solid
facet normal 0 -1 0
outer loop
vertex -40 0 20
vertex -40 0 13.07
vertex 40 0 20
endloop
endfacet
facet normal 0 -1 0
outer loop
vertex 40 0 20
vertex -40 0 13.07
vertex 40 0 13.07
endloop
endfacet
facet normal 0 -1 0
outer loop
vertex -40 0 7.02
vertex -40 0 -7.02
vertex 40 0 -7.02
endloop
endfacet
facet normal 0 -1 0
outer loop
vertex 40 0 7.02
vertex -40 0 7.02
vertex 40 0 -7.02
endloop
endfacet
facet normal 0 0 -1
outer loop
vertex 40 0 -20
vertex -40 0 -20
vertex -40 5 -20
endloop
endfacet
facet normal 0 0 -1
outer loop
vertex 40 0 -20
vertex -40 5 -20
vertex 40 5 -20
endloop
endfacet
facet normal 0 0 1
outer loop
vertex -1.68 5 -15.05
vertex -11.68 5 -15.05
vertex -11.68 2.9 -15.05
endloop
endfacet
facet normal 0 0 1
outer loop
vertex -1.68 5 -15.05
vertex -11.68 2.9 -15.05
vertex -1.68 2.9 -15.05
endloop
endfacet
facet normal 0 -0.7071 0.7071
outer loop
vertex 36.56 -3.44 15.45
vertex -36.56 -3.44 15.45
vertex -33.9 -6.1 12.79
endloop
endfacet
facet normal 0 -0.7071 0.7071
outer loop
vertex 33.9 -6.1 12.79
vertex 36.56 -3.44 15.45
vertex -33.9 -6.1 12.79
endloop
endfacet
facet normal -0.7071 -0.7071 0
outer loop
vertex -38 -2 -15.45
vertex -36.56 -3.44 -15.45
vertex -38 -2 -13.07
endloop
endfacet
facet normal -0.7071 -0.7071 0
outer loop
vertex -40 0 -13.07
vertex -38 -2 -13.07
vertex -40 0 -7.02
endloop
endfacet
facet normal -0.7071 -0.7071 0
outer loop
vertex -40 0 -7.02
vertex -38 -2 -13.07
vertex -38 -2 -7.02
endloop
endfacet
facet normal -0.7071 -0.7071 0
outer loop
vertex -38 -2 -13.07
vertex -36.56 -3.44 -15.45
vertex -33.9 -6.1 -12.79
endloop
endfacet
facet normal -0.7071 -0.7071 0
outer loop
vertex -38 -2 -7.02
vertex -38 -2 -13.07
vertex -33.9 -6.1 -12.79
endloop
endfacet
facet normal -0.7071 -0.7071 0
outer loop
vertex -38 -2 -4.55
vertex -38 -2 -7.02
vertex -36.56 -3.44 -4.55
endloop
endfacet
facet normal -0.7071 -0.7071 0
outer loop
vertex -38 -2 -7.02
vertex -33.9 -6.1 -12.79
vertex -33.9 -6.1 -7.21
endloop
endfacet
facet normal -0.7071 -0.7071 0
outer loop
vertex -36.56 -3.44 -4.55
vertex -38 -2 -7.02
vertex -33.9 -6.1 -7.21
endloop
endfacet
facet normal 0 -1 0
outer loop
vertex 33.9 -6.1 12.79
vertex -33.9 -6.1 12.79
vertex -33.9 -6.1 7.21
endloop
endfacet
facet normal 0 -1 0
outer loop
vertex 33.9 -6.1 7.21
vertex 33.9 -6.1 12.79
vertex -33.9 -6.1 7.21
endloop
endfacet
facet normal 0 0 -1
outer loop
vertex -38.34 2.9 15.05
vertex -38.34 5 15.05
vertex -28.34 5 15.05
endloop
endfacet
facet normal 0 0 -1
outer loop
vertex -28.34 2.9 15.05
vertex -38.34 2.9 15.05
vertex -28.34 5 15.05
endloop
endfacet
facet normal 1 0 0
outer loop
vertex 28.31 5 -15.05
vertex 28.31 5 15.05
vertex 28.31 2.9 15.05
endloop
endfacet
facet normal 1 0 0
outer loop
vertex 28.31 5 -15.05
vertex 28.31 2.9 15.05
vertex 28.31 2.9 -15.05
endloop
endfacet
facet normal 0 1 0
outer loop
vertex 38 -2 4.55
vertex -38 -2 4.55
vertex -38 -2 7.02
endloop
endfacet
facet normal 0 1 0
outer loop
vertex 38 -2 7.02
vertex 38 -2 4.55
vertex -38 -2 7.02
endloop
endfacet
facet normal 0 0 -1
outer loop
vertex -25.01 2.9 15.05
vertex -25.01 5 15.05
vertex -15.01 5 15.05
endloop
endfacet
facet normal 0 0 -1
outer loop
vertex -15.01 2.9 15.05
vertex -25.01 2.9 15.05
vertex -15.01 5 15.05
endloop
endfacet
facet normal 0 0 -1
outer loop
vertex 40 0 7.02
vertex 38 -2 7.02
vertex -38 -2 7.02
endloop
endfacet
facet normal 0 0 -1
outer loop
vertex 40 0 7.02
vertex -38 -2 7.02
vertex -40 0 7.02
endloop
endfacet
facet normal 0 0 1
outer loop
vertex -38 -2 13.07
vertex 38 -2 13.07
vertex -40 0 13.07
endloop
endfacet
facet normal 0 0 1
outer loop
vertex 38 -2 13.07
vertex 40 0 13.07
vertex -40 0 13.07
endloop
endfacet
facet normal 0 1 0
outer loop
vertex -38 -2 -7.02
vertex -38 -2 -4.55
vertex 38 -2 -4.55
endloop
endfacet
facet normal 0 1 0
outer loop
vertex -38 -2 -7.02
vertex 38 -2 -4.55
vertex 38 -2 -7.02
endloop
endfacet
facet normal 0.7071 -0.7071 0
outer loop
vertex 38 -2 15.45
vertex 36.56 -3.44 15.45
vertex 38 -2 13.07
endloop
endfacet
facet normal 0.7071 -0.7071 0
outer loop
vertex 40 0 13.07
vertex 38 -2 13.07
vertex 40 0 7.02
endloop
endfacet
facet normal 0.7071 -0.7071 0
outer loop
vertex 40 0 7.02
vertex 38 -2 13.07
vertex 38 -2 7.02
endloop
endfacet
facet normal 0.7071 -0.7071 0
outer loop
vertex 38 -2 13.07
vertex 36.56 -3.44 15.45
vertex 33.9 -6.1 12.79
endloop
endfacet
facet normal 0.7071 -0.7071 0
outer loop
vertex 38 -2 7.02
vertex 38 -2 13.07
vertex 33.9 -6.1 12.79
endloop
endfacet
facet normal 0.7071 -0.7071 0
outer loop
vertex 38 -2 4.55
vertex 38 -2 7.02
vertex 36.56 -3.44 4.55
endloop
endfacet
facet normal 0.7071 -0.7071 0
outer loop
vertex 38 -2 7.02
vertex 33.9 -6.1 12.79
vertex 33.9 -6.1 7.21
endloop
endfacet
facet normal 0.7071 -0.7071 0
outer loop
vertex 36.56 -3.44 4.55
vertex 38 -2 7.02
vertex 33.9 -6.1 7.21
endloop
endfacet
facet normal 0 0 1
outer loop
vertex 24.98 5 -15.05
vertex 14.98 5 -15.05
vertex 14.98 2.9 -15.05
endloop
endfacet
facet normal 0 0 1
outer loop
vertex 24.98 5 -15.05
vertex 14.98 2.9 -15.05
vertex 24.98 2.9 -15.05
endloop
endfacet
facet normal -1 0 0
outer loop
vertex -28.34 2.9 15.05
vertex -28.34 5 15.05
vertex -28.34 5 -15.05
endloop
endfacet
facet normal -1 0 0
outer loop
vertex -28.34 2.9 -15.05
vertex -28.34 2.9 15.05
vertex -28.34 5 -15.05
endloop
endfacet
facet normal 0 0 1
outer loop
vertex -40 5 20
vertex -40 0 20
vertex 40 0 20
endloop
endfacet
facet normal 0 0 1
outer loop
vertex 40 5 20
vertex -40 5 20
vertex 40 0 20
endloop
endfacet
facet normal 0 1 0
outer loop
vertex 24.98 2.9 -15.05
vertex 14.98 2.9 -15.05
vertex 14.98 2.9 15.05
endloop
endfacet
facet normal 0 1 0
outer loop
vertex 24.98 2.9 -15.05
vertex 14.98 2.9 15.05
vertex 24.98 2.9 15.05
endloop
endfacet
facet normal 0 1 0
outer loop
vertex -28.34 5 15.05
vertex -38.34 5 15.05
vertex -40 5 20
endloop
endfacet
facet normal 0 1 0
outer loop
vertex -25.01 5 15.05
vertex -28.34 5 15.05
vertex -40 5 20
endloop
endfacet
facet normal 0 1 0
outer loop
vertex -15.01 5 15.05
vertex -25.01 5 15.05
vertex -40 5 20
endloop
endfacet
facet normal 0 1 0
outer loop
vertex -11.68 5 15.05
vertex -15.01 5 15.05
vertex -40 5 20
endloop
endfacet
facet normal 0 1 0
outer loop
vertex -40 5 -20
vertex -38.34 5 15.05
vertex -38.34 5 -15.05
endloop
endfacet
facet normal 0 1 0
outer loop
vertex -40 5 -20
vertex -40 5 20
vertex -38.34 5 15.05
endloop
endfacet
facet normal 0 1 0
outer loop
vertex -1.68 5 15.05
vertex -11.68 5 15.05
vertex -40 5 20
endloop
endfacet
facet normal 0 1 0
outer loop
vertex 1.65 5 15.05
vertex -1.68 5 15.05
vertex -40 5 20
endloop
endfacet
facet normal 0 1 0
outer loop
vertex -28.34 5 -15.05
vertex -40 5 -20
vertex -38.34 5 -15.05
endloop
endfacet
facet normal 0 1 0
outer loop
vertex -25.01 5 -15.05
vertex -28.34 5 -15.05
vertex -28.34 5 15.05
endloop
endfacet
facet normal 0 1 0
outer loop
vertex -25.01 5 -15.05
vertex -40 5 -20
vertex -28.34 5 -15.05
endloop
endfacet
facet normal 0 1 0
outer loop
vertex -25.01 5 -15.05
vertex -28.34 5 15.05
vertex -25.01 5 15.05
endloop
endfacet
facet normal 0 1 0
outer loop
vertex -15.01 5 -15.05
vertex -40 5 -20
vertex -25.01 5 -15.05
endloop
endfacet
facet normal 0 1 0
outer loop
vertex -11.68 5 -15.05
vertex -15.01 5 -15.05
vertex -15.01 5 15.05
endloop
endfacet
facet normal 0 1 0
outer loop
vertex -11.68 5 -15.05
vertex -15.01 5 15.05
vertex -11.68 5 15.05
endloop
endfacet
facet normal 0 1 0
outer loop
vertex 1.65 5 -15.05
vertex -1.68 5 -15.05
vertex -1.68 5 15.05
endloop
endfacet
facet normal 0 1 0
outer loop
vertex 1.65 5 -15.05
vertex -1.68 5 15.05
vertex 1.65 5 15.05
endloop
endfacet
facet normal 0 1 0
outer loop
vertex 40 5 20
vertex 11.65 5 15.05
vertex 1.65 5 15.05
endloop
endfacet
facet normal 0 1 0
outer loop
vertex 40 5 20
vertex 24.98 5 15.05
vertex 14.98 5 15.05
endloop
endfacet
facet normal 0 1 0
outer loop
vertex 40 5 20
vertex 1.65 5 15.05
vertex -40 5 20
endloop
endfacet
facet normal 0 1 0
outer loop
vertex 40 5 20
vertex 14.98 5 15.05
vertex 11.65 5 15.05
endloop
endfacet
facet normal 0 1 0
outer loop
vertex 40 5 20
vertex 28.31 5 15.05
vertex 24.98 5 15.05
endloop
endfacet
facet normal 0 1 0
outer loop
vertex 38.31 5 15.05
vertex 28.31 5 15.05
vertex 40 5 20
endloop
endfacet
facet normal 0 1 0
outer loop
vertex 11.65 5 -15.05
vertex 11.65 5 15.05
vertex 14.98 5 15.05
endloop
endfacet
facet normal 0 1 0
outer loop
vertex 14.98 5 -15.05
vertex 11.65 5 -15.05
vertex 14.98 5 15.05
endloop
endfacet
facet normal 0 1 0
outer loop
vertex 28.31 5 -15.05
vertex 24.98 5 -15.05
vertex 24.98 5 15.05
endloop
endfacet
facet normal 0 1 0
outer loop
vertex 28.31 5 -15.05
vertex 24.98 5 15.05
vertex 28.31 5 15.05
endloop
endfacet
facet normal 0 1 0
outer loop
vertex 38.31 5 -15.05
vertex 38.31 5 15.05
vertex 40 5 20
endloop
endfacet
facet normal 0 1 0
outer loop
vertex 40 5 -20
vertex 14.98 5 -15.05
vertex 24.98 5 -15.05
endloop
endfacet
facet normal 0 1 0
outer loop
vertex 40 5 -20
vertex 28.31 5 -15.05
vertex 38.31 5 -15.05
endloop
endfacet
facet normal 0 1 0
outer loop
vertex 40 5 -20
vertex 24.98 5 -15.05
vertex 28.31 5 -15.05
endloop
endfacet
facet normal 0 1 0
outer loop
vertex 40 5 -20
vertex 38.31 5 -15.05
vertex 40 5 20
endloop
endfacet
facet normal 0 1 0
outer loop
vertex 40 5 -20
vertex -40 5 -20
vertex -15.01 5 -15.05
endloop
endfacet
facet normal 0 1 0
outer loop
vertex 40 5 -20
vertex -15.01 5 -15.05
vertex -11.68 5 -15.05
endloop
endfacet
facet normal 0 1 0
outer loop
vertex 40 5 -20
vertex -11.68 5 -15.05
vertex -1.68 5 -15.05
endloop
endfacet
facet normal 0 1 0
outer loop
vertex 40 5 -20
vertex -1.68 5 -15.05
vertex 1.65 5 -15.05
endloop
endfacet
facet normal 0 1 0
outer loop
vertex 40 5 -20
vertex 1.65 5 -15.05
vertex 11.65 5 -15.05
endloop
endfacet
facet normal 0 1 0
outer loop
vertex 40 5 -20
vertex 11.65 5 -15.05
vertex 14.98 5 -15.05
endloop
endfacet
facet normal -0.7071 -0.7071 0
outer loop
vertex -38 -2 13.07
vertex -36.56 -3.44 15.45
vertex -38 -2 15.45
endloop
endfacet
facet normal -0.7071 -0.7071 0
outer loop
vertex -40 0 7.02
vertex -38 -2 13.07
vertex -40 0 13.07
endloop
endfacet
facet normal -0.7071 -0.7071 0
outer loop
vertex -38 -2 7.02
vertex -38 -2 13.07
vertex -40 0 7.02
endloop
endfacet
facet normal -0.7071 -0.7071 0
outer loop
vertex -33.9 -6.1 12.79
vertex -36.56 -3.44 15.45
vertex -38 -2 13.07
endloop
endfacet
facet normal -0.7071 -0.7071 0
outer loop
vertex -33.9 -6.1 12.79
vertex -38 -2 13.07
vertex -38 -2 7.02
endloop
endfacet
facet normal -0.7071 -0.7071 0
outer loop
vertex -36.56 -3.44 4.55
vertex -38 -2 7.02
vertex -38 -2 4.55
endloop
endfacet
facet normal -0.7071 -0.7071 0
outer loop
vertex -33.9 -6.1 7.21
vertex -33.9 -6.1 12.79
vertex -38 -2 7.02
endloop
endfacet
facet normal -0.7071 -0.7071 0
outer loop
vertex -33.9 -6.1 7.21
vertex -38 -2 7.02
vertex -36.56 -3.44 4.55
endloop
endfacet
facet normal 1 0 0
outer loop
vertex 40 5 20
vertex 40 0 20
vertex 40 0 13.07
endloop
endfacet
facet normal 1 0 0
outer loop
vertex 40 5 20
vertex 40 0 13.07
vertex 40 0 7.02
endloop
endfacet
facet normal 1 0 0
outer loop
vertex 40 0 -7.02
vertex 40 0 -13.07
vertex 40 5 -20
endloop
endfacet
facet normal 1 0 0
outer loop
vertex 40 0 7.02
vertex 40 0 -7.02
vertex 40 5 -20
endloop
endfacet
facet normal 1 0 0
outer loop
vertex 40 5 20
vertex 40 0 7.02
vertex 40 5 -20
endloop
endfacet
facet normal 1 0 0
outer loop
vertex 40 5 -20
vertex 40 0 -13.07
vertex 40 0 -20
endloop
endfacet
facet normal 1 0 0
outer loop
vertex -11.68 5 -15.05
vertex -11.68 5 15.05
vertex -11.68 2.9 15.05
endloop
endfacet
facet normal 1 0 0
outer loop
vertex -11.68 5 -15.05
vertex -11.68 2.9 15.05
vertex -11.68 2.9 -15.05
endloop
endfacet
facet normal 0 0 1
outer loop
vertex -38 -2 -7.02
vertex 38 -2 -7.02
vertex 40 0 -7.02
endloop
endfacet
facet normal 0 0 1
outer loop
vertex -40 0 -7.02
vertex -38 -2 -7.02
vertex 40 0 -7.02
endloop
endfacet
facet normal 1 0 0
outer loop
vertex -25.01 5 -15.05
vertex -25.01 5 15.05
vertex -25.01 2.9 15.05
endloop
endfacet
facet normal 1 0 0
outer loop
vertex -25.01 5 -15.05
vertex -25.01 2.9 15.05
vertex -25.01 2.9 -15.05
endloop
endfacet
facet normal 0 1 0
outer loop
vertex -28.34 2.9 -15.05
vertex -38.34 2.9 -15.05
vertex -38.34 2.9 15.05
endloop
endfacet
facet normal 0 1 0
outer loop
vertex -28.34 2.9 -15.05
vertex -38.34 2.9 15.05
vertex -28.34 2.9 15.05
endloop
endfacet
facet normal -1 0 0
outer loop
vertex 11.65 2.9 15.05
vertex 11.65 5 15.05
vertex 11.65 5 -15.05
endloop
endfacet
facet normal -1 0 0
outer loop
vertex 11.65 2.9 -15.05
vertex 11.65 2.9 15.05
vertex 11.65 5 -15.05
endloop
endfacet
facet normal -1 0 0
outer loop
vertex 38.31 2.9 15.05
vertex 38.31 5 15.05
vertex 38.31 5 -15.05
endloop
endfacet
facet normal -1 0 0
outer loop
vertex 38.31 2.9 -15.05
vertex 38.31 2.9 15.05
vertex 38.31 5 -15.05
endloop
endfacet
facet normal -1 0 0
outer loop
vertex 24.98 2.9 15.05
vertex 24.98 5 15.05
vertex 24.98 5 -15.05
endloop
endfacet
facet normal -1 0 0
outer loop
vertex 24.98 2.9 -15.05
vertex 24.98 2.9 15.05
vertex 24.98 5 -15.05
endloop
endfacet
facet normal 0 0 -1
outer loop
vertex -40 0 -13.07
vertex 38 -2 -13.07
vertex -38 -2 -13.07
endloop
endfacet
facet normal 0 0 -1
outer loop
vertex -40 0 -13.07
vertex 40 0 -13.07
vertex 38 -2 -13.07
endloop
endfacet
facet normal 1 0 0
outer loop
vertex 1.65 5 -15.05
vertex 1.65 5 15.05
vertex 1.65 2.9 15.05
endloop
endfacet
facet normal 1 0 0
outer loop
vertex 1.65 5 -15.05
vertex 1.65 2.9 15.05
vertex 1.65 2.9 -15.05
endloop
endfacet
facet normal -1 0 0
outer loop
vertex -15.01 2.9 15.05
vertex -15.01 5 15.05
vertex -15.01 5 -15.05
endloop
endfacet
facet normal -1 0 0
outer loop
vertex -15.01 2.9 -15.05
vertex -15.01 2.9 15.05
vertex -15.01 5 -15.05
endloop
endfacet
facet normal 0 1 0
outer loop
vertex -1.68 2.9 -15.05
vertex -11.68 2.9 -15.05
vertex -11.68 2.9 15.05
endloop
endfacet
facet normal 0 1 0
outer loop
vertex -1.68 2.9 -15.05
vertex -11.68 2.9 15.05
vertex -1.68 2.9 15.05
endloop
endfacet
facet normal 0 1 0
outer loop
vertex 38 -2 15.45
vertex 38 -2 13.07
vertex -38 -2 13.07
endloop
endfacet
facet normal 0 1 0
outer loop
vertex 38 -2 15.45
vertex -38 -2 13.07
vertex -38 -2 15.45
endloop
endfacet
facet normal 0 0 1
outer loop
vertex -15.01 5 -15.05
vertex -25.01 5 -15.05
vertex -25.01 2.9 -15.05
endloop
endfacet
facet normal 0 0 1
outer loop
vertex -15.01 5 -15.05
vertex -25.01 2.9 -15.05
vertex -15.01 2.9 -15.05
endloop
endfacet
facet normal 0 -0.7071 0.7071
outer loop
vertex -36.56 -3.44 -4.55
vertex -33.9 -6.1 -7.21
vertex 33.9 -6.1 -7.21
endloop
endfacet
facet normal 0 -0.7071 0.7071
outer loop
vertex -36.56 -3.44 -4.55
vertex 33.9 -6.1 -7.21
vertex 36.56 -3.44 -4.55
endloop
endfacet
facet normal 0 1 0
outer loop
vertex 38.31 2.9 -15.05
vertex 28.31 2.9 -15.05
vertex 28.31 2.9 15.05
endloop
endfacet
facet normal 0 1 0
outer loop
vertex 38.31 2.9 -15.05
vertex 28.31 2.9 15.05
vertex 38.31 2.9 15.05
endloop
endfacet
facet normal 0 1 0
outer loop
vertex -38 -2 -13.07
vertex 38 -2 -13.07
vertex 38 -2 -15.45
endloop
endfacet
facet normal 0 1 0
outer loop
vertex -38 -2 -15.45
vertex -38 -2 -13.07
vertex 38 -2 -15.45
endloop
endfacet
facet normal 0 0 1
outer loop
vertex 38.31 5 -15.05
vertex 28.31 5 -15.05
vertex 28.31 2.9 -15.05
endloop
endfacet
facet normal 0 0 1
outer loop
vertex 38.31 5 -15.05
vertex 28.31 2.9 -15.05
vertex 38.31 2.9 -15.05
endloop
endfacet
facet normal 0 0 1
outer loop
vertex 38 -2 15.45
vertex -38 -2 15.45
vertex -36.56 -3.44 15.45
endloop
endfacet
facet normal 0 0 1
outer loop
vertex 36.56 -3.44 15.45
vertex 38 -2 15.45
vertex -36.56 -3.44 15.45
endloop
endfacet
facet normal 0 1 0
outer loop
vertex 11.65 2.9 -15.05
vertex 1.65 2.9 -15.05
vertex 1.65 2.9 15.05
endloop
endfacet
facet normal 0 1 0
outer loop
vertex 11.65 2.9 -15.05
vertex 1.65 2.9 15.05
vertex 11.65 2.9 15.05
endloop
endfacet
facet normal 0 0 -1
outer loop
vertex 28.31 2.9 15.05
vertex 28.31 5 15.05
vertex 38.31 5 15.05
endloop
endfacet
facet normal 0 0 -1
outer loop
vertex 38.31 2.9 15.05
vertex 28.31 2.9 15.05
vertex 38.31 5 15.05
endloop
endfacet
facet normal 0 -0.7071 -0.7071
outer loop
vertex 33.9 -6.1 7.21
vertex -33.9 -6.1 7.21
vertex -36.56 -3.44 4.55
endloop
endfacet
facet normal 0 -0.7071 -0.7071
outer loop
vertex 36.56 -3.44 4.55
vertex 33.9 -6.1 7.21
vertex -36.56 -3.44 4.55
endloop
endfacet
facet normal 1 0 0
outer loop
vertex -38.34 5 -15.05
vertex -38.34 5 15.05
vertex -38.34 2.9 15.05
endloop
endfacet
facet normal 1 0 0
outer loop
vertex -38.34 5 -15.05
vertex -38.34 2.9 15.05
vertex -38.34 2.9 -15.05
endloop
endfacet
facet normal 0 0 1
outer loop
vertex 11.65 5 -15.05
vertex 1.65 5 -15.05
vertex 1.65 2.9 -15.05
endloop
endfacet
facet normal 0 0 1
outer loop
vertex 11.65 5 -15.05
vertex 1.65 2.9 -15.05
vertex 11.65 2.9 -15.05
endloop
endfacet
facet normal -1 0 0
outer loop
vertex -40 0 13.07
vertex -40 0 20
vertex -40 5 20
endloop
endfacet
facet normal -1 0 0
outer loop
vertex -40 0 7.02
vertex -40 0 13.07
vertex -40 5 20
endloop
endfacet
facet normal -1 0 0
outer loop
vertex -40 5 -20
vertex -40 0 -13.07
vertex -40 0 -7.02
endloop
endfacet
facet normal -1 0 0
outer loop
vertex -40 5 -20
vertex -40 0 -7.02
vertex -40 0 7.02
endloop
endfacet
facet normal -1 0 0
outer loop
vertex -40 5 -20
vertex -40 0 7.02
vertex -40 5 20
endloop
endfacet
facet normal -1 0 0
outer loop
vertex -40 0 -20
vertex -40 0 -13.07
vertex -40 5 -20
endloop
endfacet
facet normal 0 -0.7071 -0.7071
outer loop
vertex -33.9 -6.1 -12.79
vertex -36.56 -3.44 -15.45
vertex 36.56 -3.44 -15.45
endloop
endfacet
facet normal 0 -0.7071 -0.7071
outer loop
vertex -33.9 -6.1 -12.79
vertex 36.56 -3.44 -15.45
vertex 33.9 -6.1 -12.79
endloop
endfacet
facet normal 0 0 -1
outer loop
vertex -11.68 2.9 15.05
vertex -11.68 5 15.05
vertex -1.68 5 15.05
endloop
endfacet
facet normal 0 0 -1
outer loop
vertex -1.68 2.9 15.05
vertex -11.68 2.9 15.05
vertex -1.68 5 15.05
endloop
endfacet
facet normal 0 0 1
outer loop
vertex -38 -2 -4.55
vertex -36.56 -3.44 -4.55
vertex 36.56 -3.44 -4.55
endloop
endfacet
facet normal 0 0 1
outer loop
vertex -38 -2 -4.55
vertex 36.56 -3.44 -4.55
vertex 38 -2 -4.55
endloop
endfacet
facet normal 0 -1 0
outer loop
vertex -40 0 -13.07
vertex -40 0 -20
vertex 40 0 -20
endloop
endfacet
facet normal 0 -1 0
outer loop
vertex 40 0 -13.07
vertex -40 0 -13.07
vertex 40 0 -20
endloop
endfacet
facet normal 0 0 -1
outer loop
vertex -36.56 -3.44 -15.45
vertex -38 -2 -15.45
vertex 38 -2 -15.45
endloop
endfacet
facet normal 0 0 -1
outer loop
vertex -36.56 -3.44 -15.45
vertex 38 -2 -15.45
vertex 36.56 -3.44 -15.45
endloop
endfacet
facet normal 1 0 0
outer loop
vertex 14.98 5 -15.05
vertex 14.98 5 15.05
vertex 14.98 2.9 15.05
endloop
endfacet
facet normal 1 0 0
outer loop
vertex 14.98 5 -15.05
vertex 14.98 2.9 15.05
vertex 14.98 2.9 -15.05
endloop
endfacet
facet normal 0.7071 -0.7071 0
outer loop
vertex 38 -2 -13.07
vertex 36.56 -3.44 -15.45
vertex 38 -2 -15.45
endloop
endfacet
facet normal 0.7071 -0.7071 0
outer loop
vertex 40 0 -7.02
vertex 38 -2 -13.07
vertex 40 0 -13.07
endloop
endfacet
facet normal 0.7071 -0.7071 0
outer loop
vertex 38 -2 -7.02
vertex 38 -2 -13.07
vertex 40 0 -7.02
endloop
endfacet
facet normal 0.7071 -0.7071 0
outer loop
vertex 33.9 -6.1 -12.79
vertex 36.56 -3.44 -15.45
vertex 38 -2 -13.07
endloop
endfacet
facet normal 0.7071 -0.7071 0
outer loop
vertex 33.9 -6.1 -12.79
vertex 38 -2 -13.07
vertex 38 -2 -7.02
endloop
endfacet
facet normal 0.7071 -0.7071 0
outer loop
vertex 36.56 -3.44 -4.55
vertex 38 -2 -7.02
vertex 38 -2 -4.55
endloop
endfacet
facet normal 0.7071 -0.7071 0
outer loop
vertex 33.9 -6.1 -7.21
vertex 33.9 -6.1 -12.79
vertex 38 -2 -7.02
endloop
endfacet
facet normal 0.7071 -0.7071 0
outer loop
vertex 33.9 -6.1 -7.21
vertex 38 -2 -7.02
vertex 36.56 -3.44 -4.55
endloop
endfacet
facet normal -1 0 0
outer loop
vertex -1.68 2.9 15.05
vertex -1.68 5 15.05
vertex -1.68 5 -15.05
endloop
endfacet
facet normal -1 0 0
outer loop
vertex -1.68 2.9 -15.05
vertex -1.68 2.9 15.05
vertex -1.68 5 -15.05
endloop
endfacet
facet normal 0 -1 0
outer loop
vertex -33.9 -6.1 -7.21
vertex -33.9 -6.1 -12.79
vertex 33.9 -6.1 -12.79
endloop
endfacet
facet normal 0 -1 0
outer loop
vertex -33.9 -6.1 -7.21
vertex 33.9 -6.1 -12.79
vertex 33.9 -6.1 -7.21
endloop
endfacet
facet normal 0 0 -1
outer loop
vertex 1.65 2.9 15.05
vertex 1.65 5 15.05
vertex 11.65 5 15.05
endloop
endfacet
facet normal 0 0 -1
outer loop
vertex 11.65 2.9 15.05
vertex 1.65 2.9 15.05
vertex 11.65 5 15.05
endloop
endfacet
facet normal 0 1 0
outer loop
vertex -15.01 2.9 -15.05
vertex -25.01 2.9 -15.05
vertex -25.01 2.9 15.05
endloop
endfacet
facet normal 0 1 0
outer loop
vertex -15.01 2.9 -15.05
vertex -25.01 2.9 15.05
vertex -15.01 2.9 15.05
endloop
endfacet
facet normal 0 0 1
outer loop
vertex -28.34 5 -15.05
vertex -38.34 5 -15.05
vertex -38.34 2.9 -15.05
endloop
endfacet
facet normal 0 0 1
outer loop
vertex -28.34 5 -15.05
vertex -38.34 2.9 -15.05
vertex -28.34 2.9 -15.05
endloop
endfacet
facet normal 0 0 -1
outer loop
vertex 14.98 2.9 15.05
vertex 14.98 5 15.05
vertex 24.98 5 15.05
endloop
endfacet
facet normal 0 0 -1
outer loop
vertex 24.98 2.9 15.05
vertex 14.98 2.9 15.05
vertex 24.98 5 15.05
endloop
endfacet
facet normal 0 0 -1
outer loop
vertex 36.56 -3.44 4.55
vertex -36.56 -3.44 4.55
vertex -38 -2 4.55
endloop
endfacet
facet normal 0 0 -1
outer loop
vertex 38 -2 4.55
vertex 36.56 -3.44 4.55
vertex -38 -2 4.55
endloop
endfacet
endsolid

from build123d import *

# Parameters (mm, degrees)
SKETCH_1_W             = 80
SKETCH_1_H             = 40
EXTRUDE_1_DEPTH        = 5
SKETCH_2_W             = 10
SKETCH_2_H             = 30.1
CUT_EXTRUDE_1_DEPTH    = 2.1
PATTERN_LINEAR_1_COUNT = 6
PATTERN_LINEAR_1_PITCH = 13.33
EXTRUDE_2_DEPTH        = 80
CHAMFER_1_SIZE         = 6.1


with BuildPart() as part:
    # Эскиз1 → Бобышка-Вытянуть1 (new body)
    with BuildSketch(Plane(origin=(0, 0, 0), x_dir=(1, 0, 0), z_dir=(0, 1, 0))):
        Rectangle(SKETCH_1_W, SKETCH_1_H)
    extrude(amount=EXTRUDE_1_DEPTH)

    # Эскиз2 → Вырез-Вытянуть1 (cut)
    with BuildSketch(Plane(origin=(0, 5, 0), x_dir=(1, 0, 0), z_dir=(0, 1, 0))):
        with Locations((-33.34, 0)):
            Rectangle(SKETCH_2_W, SKETCH_2_H)
    cut_extrude_1 = extrude(amount=-CUT_EXTRUDE_1_DEPTH, mode=Mode.SUBTRACT)

    # Линейный массив1: Вырез-Вытянуть1 ×6
    with Locations(*[(i * PATTERN_LINEAR_1_PITCH, 0, 0) for i in range(1, PATTERN_LINEAR_1_COUNT)]):
        add(cut_extrude_1, mode=Mode.SUBTRACT)

    # Эскиз3 → Бобышка-Вытянуть2 (add)
    with BuildSketch(Plane.ZY.offset(40)):
        Polygon((-13.07, 0), (-13.07, -2), (-15.45, -2), (-15.45, -3.44), (-12.79, -6.1), (-7.21, -6.1), (-4.55, -3.44), (-4.55, -2), (-7.02, -2), (-7.02, 0), align=None)
        Polygon((7.02, 0), (13.07, 0), (13.07, -2), (15.45, -2), (15.45, -3.44), (12.79, -6.1), (7.21, -6.1), (4.55, -3.44), (4.55, -2), (7.02, -2), align=None)
    extrude(amount=-EXTRUDE_2_DEPTH)

    # Фаска1
    chamfer_1_edges = [part.edges().sort_by_distance(p)[0] for p in [
        (40, -6.1, 10),
        (-40, -6.1, 10),
        (40, -6.1, -10),
        (-40, -6.1, -10),
    ]]
    chamfer(chamfer_1_edges, length=CHAMFER_1_SIZE)


solid = part.part
